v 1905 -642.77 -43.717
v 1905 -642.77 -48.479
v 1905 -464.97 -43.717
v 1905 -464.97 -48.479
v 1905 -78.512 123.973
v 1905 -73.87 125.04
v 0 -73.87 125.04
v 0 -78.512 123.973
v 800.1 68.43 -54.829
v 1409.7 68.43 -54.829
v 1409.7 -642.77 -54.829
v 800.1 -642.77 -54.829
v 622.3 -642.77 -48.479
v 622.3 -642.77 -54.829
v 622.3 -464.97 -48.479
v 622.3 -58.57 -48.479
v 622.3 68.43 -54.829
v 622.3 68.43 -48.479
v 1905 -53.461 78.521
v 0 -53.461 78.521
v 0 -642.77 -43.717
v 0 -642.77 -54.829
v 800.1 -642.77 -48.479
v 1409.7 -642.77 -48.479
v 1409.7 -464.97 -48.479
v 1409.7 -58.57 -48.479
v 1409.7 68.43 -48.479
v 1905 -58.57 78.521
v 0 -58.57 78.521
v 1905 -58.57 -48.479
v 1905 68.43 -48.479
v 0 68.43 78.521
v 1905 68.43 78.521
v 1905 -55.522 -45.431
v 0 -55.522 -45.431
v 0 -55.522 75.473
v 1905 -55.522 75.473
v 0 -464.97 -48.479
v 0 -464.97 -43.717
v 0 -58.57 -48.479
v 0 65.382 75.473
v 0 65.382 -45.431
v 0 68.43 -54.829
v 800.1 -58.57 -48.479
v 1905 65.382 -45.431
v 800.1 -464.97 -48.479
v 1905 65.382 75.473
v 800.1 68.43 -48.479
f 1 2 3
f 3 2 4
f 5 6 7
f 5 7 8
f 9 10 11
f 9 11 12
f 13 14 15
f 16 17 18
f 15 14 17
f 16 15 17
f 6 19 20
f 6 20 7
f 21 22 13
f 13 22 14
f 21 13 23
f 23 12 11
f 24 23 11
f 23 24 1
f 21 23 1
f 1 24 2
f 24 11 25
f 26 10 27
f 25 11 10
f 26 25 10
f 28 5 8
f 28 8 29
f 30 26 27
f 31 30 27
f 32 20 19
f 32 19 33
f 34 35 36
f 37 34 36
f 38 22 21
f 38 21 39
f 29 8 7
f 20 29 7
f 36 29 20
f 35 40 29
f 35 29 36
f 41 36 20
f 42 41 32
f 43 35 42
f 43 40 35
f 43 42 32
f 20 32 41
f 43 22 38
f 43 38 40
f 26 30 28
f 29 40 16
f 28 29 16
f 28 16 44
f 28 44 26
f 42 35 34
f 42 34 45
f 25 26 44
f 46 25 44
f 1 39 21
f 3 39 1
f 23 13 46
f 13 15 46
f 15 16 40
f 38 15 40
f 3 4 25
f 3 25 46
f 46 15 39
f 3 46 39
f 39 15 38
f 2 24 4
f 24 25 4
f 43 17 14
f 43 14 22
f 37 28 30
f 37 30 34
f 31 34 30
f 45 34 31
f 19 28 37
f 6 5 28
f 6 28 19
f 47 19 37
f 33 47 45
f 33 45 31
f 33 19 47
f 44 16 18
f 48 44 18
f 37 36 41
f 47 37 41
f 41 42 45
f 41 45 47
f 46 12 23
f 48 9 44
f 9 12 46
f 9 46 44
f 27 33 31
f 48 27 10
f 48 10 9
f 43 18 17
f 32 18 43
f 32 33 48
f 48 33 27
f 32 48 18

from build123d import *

# Parameters (mm, degrees)
F0_W     = 127
F0_H     = 127
F0_W_2   = 120.904
F0_H_2   = 120.904
F1_DEPTH = 1905
F3_DEPTH = 1905
F4_W     = 622.3
F4_H     = 6.35
F4_W_2   = 609.6
F5_DEPTH = 711.2
F6_W     = 1282.7
F6_H     = 177.8
F6_W_2   = 622.3
F7_DEPTH = 4.7625


with BuildPart() as f1:
    # F0 (on Right) → F1 (new body)
    with BuildSketch(Plane.YZ):
        with Locations((4.929526709, 15.0205540939)):
            Rectangle(F0_W, F0_H)
        with Locations((4.929526709, 15.0205540939)):
            Rectangle(F0_W_2, F0_H_2, mode=Mode.SUBTRACT)
    extrude(amount=F1_DEPTH)

    # F2 (on face) → F3 (join)
    with BuildSketch(Plane.YZ.offset(1905)):
        Polygon((-78.5117968917, 123.9730939269), (-58.570473291, 78.5205540939), (-53.4608645662, 78.5205540939), (-73.8704177914, 125.0403363069), align=None)
    extrude(amount=-F3_DEPTH)

    # F4 (on face) → F5 (join)
    with BuildSketch(Plane(origin=(0, 68.429526709, 0), x_dir=(-1, 0, 0), z_dir=(0, 1, 0))):
        with Locations((-311.15, -51.6544459061)):
            Rectangle(F4_W, F4_H)
        with Locations((-1104.9, -51.6544459061)):
            Rectangle(F4_W_2, F4_H)
    extrude(amount=-F5_DEPTH)

    # F6 (on face) → F7 (join)
    with BuildSketch(Plane.XY.offset(-48.4794459061)):
        with Locations((1263.65, -553.870473291)):
            Rectangle(F6_W, F6_H)
        with Locations((311.15, -553.870473291)):
            Rectangle(F6_W_2, F6_H)
    extrude(amount=F7_DEPTH)


solid = f1.part
